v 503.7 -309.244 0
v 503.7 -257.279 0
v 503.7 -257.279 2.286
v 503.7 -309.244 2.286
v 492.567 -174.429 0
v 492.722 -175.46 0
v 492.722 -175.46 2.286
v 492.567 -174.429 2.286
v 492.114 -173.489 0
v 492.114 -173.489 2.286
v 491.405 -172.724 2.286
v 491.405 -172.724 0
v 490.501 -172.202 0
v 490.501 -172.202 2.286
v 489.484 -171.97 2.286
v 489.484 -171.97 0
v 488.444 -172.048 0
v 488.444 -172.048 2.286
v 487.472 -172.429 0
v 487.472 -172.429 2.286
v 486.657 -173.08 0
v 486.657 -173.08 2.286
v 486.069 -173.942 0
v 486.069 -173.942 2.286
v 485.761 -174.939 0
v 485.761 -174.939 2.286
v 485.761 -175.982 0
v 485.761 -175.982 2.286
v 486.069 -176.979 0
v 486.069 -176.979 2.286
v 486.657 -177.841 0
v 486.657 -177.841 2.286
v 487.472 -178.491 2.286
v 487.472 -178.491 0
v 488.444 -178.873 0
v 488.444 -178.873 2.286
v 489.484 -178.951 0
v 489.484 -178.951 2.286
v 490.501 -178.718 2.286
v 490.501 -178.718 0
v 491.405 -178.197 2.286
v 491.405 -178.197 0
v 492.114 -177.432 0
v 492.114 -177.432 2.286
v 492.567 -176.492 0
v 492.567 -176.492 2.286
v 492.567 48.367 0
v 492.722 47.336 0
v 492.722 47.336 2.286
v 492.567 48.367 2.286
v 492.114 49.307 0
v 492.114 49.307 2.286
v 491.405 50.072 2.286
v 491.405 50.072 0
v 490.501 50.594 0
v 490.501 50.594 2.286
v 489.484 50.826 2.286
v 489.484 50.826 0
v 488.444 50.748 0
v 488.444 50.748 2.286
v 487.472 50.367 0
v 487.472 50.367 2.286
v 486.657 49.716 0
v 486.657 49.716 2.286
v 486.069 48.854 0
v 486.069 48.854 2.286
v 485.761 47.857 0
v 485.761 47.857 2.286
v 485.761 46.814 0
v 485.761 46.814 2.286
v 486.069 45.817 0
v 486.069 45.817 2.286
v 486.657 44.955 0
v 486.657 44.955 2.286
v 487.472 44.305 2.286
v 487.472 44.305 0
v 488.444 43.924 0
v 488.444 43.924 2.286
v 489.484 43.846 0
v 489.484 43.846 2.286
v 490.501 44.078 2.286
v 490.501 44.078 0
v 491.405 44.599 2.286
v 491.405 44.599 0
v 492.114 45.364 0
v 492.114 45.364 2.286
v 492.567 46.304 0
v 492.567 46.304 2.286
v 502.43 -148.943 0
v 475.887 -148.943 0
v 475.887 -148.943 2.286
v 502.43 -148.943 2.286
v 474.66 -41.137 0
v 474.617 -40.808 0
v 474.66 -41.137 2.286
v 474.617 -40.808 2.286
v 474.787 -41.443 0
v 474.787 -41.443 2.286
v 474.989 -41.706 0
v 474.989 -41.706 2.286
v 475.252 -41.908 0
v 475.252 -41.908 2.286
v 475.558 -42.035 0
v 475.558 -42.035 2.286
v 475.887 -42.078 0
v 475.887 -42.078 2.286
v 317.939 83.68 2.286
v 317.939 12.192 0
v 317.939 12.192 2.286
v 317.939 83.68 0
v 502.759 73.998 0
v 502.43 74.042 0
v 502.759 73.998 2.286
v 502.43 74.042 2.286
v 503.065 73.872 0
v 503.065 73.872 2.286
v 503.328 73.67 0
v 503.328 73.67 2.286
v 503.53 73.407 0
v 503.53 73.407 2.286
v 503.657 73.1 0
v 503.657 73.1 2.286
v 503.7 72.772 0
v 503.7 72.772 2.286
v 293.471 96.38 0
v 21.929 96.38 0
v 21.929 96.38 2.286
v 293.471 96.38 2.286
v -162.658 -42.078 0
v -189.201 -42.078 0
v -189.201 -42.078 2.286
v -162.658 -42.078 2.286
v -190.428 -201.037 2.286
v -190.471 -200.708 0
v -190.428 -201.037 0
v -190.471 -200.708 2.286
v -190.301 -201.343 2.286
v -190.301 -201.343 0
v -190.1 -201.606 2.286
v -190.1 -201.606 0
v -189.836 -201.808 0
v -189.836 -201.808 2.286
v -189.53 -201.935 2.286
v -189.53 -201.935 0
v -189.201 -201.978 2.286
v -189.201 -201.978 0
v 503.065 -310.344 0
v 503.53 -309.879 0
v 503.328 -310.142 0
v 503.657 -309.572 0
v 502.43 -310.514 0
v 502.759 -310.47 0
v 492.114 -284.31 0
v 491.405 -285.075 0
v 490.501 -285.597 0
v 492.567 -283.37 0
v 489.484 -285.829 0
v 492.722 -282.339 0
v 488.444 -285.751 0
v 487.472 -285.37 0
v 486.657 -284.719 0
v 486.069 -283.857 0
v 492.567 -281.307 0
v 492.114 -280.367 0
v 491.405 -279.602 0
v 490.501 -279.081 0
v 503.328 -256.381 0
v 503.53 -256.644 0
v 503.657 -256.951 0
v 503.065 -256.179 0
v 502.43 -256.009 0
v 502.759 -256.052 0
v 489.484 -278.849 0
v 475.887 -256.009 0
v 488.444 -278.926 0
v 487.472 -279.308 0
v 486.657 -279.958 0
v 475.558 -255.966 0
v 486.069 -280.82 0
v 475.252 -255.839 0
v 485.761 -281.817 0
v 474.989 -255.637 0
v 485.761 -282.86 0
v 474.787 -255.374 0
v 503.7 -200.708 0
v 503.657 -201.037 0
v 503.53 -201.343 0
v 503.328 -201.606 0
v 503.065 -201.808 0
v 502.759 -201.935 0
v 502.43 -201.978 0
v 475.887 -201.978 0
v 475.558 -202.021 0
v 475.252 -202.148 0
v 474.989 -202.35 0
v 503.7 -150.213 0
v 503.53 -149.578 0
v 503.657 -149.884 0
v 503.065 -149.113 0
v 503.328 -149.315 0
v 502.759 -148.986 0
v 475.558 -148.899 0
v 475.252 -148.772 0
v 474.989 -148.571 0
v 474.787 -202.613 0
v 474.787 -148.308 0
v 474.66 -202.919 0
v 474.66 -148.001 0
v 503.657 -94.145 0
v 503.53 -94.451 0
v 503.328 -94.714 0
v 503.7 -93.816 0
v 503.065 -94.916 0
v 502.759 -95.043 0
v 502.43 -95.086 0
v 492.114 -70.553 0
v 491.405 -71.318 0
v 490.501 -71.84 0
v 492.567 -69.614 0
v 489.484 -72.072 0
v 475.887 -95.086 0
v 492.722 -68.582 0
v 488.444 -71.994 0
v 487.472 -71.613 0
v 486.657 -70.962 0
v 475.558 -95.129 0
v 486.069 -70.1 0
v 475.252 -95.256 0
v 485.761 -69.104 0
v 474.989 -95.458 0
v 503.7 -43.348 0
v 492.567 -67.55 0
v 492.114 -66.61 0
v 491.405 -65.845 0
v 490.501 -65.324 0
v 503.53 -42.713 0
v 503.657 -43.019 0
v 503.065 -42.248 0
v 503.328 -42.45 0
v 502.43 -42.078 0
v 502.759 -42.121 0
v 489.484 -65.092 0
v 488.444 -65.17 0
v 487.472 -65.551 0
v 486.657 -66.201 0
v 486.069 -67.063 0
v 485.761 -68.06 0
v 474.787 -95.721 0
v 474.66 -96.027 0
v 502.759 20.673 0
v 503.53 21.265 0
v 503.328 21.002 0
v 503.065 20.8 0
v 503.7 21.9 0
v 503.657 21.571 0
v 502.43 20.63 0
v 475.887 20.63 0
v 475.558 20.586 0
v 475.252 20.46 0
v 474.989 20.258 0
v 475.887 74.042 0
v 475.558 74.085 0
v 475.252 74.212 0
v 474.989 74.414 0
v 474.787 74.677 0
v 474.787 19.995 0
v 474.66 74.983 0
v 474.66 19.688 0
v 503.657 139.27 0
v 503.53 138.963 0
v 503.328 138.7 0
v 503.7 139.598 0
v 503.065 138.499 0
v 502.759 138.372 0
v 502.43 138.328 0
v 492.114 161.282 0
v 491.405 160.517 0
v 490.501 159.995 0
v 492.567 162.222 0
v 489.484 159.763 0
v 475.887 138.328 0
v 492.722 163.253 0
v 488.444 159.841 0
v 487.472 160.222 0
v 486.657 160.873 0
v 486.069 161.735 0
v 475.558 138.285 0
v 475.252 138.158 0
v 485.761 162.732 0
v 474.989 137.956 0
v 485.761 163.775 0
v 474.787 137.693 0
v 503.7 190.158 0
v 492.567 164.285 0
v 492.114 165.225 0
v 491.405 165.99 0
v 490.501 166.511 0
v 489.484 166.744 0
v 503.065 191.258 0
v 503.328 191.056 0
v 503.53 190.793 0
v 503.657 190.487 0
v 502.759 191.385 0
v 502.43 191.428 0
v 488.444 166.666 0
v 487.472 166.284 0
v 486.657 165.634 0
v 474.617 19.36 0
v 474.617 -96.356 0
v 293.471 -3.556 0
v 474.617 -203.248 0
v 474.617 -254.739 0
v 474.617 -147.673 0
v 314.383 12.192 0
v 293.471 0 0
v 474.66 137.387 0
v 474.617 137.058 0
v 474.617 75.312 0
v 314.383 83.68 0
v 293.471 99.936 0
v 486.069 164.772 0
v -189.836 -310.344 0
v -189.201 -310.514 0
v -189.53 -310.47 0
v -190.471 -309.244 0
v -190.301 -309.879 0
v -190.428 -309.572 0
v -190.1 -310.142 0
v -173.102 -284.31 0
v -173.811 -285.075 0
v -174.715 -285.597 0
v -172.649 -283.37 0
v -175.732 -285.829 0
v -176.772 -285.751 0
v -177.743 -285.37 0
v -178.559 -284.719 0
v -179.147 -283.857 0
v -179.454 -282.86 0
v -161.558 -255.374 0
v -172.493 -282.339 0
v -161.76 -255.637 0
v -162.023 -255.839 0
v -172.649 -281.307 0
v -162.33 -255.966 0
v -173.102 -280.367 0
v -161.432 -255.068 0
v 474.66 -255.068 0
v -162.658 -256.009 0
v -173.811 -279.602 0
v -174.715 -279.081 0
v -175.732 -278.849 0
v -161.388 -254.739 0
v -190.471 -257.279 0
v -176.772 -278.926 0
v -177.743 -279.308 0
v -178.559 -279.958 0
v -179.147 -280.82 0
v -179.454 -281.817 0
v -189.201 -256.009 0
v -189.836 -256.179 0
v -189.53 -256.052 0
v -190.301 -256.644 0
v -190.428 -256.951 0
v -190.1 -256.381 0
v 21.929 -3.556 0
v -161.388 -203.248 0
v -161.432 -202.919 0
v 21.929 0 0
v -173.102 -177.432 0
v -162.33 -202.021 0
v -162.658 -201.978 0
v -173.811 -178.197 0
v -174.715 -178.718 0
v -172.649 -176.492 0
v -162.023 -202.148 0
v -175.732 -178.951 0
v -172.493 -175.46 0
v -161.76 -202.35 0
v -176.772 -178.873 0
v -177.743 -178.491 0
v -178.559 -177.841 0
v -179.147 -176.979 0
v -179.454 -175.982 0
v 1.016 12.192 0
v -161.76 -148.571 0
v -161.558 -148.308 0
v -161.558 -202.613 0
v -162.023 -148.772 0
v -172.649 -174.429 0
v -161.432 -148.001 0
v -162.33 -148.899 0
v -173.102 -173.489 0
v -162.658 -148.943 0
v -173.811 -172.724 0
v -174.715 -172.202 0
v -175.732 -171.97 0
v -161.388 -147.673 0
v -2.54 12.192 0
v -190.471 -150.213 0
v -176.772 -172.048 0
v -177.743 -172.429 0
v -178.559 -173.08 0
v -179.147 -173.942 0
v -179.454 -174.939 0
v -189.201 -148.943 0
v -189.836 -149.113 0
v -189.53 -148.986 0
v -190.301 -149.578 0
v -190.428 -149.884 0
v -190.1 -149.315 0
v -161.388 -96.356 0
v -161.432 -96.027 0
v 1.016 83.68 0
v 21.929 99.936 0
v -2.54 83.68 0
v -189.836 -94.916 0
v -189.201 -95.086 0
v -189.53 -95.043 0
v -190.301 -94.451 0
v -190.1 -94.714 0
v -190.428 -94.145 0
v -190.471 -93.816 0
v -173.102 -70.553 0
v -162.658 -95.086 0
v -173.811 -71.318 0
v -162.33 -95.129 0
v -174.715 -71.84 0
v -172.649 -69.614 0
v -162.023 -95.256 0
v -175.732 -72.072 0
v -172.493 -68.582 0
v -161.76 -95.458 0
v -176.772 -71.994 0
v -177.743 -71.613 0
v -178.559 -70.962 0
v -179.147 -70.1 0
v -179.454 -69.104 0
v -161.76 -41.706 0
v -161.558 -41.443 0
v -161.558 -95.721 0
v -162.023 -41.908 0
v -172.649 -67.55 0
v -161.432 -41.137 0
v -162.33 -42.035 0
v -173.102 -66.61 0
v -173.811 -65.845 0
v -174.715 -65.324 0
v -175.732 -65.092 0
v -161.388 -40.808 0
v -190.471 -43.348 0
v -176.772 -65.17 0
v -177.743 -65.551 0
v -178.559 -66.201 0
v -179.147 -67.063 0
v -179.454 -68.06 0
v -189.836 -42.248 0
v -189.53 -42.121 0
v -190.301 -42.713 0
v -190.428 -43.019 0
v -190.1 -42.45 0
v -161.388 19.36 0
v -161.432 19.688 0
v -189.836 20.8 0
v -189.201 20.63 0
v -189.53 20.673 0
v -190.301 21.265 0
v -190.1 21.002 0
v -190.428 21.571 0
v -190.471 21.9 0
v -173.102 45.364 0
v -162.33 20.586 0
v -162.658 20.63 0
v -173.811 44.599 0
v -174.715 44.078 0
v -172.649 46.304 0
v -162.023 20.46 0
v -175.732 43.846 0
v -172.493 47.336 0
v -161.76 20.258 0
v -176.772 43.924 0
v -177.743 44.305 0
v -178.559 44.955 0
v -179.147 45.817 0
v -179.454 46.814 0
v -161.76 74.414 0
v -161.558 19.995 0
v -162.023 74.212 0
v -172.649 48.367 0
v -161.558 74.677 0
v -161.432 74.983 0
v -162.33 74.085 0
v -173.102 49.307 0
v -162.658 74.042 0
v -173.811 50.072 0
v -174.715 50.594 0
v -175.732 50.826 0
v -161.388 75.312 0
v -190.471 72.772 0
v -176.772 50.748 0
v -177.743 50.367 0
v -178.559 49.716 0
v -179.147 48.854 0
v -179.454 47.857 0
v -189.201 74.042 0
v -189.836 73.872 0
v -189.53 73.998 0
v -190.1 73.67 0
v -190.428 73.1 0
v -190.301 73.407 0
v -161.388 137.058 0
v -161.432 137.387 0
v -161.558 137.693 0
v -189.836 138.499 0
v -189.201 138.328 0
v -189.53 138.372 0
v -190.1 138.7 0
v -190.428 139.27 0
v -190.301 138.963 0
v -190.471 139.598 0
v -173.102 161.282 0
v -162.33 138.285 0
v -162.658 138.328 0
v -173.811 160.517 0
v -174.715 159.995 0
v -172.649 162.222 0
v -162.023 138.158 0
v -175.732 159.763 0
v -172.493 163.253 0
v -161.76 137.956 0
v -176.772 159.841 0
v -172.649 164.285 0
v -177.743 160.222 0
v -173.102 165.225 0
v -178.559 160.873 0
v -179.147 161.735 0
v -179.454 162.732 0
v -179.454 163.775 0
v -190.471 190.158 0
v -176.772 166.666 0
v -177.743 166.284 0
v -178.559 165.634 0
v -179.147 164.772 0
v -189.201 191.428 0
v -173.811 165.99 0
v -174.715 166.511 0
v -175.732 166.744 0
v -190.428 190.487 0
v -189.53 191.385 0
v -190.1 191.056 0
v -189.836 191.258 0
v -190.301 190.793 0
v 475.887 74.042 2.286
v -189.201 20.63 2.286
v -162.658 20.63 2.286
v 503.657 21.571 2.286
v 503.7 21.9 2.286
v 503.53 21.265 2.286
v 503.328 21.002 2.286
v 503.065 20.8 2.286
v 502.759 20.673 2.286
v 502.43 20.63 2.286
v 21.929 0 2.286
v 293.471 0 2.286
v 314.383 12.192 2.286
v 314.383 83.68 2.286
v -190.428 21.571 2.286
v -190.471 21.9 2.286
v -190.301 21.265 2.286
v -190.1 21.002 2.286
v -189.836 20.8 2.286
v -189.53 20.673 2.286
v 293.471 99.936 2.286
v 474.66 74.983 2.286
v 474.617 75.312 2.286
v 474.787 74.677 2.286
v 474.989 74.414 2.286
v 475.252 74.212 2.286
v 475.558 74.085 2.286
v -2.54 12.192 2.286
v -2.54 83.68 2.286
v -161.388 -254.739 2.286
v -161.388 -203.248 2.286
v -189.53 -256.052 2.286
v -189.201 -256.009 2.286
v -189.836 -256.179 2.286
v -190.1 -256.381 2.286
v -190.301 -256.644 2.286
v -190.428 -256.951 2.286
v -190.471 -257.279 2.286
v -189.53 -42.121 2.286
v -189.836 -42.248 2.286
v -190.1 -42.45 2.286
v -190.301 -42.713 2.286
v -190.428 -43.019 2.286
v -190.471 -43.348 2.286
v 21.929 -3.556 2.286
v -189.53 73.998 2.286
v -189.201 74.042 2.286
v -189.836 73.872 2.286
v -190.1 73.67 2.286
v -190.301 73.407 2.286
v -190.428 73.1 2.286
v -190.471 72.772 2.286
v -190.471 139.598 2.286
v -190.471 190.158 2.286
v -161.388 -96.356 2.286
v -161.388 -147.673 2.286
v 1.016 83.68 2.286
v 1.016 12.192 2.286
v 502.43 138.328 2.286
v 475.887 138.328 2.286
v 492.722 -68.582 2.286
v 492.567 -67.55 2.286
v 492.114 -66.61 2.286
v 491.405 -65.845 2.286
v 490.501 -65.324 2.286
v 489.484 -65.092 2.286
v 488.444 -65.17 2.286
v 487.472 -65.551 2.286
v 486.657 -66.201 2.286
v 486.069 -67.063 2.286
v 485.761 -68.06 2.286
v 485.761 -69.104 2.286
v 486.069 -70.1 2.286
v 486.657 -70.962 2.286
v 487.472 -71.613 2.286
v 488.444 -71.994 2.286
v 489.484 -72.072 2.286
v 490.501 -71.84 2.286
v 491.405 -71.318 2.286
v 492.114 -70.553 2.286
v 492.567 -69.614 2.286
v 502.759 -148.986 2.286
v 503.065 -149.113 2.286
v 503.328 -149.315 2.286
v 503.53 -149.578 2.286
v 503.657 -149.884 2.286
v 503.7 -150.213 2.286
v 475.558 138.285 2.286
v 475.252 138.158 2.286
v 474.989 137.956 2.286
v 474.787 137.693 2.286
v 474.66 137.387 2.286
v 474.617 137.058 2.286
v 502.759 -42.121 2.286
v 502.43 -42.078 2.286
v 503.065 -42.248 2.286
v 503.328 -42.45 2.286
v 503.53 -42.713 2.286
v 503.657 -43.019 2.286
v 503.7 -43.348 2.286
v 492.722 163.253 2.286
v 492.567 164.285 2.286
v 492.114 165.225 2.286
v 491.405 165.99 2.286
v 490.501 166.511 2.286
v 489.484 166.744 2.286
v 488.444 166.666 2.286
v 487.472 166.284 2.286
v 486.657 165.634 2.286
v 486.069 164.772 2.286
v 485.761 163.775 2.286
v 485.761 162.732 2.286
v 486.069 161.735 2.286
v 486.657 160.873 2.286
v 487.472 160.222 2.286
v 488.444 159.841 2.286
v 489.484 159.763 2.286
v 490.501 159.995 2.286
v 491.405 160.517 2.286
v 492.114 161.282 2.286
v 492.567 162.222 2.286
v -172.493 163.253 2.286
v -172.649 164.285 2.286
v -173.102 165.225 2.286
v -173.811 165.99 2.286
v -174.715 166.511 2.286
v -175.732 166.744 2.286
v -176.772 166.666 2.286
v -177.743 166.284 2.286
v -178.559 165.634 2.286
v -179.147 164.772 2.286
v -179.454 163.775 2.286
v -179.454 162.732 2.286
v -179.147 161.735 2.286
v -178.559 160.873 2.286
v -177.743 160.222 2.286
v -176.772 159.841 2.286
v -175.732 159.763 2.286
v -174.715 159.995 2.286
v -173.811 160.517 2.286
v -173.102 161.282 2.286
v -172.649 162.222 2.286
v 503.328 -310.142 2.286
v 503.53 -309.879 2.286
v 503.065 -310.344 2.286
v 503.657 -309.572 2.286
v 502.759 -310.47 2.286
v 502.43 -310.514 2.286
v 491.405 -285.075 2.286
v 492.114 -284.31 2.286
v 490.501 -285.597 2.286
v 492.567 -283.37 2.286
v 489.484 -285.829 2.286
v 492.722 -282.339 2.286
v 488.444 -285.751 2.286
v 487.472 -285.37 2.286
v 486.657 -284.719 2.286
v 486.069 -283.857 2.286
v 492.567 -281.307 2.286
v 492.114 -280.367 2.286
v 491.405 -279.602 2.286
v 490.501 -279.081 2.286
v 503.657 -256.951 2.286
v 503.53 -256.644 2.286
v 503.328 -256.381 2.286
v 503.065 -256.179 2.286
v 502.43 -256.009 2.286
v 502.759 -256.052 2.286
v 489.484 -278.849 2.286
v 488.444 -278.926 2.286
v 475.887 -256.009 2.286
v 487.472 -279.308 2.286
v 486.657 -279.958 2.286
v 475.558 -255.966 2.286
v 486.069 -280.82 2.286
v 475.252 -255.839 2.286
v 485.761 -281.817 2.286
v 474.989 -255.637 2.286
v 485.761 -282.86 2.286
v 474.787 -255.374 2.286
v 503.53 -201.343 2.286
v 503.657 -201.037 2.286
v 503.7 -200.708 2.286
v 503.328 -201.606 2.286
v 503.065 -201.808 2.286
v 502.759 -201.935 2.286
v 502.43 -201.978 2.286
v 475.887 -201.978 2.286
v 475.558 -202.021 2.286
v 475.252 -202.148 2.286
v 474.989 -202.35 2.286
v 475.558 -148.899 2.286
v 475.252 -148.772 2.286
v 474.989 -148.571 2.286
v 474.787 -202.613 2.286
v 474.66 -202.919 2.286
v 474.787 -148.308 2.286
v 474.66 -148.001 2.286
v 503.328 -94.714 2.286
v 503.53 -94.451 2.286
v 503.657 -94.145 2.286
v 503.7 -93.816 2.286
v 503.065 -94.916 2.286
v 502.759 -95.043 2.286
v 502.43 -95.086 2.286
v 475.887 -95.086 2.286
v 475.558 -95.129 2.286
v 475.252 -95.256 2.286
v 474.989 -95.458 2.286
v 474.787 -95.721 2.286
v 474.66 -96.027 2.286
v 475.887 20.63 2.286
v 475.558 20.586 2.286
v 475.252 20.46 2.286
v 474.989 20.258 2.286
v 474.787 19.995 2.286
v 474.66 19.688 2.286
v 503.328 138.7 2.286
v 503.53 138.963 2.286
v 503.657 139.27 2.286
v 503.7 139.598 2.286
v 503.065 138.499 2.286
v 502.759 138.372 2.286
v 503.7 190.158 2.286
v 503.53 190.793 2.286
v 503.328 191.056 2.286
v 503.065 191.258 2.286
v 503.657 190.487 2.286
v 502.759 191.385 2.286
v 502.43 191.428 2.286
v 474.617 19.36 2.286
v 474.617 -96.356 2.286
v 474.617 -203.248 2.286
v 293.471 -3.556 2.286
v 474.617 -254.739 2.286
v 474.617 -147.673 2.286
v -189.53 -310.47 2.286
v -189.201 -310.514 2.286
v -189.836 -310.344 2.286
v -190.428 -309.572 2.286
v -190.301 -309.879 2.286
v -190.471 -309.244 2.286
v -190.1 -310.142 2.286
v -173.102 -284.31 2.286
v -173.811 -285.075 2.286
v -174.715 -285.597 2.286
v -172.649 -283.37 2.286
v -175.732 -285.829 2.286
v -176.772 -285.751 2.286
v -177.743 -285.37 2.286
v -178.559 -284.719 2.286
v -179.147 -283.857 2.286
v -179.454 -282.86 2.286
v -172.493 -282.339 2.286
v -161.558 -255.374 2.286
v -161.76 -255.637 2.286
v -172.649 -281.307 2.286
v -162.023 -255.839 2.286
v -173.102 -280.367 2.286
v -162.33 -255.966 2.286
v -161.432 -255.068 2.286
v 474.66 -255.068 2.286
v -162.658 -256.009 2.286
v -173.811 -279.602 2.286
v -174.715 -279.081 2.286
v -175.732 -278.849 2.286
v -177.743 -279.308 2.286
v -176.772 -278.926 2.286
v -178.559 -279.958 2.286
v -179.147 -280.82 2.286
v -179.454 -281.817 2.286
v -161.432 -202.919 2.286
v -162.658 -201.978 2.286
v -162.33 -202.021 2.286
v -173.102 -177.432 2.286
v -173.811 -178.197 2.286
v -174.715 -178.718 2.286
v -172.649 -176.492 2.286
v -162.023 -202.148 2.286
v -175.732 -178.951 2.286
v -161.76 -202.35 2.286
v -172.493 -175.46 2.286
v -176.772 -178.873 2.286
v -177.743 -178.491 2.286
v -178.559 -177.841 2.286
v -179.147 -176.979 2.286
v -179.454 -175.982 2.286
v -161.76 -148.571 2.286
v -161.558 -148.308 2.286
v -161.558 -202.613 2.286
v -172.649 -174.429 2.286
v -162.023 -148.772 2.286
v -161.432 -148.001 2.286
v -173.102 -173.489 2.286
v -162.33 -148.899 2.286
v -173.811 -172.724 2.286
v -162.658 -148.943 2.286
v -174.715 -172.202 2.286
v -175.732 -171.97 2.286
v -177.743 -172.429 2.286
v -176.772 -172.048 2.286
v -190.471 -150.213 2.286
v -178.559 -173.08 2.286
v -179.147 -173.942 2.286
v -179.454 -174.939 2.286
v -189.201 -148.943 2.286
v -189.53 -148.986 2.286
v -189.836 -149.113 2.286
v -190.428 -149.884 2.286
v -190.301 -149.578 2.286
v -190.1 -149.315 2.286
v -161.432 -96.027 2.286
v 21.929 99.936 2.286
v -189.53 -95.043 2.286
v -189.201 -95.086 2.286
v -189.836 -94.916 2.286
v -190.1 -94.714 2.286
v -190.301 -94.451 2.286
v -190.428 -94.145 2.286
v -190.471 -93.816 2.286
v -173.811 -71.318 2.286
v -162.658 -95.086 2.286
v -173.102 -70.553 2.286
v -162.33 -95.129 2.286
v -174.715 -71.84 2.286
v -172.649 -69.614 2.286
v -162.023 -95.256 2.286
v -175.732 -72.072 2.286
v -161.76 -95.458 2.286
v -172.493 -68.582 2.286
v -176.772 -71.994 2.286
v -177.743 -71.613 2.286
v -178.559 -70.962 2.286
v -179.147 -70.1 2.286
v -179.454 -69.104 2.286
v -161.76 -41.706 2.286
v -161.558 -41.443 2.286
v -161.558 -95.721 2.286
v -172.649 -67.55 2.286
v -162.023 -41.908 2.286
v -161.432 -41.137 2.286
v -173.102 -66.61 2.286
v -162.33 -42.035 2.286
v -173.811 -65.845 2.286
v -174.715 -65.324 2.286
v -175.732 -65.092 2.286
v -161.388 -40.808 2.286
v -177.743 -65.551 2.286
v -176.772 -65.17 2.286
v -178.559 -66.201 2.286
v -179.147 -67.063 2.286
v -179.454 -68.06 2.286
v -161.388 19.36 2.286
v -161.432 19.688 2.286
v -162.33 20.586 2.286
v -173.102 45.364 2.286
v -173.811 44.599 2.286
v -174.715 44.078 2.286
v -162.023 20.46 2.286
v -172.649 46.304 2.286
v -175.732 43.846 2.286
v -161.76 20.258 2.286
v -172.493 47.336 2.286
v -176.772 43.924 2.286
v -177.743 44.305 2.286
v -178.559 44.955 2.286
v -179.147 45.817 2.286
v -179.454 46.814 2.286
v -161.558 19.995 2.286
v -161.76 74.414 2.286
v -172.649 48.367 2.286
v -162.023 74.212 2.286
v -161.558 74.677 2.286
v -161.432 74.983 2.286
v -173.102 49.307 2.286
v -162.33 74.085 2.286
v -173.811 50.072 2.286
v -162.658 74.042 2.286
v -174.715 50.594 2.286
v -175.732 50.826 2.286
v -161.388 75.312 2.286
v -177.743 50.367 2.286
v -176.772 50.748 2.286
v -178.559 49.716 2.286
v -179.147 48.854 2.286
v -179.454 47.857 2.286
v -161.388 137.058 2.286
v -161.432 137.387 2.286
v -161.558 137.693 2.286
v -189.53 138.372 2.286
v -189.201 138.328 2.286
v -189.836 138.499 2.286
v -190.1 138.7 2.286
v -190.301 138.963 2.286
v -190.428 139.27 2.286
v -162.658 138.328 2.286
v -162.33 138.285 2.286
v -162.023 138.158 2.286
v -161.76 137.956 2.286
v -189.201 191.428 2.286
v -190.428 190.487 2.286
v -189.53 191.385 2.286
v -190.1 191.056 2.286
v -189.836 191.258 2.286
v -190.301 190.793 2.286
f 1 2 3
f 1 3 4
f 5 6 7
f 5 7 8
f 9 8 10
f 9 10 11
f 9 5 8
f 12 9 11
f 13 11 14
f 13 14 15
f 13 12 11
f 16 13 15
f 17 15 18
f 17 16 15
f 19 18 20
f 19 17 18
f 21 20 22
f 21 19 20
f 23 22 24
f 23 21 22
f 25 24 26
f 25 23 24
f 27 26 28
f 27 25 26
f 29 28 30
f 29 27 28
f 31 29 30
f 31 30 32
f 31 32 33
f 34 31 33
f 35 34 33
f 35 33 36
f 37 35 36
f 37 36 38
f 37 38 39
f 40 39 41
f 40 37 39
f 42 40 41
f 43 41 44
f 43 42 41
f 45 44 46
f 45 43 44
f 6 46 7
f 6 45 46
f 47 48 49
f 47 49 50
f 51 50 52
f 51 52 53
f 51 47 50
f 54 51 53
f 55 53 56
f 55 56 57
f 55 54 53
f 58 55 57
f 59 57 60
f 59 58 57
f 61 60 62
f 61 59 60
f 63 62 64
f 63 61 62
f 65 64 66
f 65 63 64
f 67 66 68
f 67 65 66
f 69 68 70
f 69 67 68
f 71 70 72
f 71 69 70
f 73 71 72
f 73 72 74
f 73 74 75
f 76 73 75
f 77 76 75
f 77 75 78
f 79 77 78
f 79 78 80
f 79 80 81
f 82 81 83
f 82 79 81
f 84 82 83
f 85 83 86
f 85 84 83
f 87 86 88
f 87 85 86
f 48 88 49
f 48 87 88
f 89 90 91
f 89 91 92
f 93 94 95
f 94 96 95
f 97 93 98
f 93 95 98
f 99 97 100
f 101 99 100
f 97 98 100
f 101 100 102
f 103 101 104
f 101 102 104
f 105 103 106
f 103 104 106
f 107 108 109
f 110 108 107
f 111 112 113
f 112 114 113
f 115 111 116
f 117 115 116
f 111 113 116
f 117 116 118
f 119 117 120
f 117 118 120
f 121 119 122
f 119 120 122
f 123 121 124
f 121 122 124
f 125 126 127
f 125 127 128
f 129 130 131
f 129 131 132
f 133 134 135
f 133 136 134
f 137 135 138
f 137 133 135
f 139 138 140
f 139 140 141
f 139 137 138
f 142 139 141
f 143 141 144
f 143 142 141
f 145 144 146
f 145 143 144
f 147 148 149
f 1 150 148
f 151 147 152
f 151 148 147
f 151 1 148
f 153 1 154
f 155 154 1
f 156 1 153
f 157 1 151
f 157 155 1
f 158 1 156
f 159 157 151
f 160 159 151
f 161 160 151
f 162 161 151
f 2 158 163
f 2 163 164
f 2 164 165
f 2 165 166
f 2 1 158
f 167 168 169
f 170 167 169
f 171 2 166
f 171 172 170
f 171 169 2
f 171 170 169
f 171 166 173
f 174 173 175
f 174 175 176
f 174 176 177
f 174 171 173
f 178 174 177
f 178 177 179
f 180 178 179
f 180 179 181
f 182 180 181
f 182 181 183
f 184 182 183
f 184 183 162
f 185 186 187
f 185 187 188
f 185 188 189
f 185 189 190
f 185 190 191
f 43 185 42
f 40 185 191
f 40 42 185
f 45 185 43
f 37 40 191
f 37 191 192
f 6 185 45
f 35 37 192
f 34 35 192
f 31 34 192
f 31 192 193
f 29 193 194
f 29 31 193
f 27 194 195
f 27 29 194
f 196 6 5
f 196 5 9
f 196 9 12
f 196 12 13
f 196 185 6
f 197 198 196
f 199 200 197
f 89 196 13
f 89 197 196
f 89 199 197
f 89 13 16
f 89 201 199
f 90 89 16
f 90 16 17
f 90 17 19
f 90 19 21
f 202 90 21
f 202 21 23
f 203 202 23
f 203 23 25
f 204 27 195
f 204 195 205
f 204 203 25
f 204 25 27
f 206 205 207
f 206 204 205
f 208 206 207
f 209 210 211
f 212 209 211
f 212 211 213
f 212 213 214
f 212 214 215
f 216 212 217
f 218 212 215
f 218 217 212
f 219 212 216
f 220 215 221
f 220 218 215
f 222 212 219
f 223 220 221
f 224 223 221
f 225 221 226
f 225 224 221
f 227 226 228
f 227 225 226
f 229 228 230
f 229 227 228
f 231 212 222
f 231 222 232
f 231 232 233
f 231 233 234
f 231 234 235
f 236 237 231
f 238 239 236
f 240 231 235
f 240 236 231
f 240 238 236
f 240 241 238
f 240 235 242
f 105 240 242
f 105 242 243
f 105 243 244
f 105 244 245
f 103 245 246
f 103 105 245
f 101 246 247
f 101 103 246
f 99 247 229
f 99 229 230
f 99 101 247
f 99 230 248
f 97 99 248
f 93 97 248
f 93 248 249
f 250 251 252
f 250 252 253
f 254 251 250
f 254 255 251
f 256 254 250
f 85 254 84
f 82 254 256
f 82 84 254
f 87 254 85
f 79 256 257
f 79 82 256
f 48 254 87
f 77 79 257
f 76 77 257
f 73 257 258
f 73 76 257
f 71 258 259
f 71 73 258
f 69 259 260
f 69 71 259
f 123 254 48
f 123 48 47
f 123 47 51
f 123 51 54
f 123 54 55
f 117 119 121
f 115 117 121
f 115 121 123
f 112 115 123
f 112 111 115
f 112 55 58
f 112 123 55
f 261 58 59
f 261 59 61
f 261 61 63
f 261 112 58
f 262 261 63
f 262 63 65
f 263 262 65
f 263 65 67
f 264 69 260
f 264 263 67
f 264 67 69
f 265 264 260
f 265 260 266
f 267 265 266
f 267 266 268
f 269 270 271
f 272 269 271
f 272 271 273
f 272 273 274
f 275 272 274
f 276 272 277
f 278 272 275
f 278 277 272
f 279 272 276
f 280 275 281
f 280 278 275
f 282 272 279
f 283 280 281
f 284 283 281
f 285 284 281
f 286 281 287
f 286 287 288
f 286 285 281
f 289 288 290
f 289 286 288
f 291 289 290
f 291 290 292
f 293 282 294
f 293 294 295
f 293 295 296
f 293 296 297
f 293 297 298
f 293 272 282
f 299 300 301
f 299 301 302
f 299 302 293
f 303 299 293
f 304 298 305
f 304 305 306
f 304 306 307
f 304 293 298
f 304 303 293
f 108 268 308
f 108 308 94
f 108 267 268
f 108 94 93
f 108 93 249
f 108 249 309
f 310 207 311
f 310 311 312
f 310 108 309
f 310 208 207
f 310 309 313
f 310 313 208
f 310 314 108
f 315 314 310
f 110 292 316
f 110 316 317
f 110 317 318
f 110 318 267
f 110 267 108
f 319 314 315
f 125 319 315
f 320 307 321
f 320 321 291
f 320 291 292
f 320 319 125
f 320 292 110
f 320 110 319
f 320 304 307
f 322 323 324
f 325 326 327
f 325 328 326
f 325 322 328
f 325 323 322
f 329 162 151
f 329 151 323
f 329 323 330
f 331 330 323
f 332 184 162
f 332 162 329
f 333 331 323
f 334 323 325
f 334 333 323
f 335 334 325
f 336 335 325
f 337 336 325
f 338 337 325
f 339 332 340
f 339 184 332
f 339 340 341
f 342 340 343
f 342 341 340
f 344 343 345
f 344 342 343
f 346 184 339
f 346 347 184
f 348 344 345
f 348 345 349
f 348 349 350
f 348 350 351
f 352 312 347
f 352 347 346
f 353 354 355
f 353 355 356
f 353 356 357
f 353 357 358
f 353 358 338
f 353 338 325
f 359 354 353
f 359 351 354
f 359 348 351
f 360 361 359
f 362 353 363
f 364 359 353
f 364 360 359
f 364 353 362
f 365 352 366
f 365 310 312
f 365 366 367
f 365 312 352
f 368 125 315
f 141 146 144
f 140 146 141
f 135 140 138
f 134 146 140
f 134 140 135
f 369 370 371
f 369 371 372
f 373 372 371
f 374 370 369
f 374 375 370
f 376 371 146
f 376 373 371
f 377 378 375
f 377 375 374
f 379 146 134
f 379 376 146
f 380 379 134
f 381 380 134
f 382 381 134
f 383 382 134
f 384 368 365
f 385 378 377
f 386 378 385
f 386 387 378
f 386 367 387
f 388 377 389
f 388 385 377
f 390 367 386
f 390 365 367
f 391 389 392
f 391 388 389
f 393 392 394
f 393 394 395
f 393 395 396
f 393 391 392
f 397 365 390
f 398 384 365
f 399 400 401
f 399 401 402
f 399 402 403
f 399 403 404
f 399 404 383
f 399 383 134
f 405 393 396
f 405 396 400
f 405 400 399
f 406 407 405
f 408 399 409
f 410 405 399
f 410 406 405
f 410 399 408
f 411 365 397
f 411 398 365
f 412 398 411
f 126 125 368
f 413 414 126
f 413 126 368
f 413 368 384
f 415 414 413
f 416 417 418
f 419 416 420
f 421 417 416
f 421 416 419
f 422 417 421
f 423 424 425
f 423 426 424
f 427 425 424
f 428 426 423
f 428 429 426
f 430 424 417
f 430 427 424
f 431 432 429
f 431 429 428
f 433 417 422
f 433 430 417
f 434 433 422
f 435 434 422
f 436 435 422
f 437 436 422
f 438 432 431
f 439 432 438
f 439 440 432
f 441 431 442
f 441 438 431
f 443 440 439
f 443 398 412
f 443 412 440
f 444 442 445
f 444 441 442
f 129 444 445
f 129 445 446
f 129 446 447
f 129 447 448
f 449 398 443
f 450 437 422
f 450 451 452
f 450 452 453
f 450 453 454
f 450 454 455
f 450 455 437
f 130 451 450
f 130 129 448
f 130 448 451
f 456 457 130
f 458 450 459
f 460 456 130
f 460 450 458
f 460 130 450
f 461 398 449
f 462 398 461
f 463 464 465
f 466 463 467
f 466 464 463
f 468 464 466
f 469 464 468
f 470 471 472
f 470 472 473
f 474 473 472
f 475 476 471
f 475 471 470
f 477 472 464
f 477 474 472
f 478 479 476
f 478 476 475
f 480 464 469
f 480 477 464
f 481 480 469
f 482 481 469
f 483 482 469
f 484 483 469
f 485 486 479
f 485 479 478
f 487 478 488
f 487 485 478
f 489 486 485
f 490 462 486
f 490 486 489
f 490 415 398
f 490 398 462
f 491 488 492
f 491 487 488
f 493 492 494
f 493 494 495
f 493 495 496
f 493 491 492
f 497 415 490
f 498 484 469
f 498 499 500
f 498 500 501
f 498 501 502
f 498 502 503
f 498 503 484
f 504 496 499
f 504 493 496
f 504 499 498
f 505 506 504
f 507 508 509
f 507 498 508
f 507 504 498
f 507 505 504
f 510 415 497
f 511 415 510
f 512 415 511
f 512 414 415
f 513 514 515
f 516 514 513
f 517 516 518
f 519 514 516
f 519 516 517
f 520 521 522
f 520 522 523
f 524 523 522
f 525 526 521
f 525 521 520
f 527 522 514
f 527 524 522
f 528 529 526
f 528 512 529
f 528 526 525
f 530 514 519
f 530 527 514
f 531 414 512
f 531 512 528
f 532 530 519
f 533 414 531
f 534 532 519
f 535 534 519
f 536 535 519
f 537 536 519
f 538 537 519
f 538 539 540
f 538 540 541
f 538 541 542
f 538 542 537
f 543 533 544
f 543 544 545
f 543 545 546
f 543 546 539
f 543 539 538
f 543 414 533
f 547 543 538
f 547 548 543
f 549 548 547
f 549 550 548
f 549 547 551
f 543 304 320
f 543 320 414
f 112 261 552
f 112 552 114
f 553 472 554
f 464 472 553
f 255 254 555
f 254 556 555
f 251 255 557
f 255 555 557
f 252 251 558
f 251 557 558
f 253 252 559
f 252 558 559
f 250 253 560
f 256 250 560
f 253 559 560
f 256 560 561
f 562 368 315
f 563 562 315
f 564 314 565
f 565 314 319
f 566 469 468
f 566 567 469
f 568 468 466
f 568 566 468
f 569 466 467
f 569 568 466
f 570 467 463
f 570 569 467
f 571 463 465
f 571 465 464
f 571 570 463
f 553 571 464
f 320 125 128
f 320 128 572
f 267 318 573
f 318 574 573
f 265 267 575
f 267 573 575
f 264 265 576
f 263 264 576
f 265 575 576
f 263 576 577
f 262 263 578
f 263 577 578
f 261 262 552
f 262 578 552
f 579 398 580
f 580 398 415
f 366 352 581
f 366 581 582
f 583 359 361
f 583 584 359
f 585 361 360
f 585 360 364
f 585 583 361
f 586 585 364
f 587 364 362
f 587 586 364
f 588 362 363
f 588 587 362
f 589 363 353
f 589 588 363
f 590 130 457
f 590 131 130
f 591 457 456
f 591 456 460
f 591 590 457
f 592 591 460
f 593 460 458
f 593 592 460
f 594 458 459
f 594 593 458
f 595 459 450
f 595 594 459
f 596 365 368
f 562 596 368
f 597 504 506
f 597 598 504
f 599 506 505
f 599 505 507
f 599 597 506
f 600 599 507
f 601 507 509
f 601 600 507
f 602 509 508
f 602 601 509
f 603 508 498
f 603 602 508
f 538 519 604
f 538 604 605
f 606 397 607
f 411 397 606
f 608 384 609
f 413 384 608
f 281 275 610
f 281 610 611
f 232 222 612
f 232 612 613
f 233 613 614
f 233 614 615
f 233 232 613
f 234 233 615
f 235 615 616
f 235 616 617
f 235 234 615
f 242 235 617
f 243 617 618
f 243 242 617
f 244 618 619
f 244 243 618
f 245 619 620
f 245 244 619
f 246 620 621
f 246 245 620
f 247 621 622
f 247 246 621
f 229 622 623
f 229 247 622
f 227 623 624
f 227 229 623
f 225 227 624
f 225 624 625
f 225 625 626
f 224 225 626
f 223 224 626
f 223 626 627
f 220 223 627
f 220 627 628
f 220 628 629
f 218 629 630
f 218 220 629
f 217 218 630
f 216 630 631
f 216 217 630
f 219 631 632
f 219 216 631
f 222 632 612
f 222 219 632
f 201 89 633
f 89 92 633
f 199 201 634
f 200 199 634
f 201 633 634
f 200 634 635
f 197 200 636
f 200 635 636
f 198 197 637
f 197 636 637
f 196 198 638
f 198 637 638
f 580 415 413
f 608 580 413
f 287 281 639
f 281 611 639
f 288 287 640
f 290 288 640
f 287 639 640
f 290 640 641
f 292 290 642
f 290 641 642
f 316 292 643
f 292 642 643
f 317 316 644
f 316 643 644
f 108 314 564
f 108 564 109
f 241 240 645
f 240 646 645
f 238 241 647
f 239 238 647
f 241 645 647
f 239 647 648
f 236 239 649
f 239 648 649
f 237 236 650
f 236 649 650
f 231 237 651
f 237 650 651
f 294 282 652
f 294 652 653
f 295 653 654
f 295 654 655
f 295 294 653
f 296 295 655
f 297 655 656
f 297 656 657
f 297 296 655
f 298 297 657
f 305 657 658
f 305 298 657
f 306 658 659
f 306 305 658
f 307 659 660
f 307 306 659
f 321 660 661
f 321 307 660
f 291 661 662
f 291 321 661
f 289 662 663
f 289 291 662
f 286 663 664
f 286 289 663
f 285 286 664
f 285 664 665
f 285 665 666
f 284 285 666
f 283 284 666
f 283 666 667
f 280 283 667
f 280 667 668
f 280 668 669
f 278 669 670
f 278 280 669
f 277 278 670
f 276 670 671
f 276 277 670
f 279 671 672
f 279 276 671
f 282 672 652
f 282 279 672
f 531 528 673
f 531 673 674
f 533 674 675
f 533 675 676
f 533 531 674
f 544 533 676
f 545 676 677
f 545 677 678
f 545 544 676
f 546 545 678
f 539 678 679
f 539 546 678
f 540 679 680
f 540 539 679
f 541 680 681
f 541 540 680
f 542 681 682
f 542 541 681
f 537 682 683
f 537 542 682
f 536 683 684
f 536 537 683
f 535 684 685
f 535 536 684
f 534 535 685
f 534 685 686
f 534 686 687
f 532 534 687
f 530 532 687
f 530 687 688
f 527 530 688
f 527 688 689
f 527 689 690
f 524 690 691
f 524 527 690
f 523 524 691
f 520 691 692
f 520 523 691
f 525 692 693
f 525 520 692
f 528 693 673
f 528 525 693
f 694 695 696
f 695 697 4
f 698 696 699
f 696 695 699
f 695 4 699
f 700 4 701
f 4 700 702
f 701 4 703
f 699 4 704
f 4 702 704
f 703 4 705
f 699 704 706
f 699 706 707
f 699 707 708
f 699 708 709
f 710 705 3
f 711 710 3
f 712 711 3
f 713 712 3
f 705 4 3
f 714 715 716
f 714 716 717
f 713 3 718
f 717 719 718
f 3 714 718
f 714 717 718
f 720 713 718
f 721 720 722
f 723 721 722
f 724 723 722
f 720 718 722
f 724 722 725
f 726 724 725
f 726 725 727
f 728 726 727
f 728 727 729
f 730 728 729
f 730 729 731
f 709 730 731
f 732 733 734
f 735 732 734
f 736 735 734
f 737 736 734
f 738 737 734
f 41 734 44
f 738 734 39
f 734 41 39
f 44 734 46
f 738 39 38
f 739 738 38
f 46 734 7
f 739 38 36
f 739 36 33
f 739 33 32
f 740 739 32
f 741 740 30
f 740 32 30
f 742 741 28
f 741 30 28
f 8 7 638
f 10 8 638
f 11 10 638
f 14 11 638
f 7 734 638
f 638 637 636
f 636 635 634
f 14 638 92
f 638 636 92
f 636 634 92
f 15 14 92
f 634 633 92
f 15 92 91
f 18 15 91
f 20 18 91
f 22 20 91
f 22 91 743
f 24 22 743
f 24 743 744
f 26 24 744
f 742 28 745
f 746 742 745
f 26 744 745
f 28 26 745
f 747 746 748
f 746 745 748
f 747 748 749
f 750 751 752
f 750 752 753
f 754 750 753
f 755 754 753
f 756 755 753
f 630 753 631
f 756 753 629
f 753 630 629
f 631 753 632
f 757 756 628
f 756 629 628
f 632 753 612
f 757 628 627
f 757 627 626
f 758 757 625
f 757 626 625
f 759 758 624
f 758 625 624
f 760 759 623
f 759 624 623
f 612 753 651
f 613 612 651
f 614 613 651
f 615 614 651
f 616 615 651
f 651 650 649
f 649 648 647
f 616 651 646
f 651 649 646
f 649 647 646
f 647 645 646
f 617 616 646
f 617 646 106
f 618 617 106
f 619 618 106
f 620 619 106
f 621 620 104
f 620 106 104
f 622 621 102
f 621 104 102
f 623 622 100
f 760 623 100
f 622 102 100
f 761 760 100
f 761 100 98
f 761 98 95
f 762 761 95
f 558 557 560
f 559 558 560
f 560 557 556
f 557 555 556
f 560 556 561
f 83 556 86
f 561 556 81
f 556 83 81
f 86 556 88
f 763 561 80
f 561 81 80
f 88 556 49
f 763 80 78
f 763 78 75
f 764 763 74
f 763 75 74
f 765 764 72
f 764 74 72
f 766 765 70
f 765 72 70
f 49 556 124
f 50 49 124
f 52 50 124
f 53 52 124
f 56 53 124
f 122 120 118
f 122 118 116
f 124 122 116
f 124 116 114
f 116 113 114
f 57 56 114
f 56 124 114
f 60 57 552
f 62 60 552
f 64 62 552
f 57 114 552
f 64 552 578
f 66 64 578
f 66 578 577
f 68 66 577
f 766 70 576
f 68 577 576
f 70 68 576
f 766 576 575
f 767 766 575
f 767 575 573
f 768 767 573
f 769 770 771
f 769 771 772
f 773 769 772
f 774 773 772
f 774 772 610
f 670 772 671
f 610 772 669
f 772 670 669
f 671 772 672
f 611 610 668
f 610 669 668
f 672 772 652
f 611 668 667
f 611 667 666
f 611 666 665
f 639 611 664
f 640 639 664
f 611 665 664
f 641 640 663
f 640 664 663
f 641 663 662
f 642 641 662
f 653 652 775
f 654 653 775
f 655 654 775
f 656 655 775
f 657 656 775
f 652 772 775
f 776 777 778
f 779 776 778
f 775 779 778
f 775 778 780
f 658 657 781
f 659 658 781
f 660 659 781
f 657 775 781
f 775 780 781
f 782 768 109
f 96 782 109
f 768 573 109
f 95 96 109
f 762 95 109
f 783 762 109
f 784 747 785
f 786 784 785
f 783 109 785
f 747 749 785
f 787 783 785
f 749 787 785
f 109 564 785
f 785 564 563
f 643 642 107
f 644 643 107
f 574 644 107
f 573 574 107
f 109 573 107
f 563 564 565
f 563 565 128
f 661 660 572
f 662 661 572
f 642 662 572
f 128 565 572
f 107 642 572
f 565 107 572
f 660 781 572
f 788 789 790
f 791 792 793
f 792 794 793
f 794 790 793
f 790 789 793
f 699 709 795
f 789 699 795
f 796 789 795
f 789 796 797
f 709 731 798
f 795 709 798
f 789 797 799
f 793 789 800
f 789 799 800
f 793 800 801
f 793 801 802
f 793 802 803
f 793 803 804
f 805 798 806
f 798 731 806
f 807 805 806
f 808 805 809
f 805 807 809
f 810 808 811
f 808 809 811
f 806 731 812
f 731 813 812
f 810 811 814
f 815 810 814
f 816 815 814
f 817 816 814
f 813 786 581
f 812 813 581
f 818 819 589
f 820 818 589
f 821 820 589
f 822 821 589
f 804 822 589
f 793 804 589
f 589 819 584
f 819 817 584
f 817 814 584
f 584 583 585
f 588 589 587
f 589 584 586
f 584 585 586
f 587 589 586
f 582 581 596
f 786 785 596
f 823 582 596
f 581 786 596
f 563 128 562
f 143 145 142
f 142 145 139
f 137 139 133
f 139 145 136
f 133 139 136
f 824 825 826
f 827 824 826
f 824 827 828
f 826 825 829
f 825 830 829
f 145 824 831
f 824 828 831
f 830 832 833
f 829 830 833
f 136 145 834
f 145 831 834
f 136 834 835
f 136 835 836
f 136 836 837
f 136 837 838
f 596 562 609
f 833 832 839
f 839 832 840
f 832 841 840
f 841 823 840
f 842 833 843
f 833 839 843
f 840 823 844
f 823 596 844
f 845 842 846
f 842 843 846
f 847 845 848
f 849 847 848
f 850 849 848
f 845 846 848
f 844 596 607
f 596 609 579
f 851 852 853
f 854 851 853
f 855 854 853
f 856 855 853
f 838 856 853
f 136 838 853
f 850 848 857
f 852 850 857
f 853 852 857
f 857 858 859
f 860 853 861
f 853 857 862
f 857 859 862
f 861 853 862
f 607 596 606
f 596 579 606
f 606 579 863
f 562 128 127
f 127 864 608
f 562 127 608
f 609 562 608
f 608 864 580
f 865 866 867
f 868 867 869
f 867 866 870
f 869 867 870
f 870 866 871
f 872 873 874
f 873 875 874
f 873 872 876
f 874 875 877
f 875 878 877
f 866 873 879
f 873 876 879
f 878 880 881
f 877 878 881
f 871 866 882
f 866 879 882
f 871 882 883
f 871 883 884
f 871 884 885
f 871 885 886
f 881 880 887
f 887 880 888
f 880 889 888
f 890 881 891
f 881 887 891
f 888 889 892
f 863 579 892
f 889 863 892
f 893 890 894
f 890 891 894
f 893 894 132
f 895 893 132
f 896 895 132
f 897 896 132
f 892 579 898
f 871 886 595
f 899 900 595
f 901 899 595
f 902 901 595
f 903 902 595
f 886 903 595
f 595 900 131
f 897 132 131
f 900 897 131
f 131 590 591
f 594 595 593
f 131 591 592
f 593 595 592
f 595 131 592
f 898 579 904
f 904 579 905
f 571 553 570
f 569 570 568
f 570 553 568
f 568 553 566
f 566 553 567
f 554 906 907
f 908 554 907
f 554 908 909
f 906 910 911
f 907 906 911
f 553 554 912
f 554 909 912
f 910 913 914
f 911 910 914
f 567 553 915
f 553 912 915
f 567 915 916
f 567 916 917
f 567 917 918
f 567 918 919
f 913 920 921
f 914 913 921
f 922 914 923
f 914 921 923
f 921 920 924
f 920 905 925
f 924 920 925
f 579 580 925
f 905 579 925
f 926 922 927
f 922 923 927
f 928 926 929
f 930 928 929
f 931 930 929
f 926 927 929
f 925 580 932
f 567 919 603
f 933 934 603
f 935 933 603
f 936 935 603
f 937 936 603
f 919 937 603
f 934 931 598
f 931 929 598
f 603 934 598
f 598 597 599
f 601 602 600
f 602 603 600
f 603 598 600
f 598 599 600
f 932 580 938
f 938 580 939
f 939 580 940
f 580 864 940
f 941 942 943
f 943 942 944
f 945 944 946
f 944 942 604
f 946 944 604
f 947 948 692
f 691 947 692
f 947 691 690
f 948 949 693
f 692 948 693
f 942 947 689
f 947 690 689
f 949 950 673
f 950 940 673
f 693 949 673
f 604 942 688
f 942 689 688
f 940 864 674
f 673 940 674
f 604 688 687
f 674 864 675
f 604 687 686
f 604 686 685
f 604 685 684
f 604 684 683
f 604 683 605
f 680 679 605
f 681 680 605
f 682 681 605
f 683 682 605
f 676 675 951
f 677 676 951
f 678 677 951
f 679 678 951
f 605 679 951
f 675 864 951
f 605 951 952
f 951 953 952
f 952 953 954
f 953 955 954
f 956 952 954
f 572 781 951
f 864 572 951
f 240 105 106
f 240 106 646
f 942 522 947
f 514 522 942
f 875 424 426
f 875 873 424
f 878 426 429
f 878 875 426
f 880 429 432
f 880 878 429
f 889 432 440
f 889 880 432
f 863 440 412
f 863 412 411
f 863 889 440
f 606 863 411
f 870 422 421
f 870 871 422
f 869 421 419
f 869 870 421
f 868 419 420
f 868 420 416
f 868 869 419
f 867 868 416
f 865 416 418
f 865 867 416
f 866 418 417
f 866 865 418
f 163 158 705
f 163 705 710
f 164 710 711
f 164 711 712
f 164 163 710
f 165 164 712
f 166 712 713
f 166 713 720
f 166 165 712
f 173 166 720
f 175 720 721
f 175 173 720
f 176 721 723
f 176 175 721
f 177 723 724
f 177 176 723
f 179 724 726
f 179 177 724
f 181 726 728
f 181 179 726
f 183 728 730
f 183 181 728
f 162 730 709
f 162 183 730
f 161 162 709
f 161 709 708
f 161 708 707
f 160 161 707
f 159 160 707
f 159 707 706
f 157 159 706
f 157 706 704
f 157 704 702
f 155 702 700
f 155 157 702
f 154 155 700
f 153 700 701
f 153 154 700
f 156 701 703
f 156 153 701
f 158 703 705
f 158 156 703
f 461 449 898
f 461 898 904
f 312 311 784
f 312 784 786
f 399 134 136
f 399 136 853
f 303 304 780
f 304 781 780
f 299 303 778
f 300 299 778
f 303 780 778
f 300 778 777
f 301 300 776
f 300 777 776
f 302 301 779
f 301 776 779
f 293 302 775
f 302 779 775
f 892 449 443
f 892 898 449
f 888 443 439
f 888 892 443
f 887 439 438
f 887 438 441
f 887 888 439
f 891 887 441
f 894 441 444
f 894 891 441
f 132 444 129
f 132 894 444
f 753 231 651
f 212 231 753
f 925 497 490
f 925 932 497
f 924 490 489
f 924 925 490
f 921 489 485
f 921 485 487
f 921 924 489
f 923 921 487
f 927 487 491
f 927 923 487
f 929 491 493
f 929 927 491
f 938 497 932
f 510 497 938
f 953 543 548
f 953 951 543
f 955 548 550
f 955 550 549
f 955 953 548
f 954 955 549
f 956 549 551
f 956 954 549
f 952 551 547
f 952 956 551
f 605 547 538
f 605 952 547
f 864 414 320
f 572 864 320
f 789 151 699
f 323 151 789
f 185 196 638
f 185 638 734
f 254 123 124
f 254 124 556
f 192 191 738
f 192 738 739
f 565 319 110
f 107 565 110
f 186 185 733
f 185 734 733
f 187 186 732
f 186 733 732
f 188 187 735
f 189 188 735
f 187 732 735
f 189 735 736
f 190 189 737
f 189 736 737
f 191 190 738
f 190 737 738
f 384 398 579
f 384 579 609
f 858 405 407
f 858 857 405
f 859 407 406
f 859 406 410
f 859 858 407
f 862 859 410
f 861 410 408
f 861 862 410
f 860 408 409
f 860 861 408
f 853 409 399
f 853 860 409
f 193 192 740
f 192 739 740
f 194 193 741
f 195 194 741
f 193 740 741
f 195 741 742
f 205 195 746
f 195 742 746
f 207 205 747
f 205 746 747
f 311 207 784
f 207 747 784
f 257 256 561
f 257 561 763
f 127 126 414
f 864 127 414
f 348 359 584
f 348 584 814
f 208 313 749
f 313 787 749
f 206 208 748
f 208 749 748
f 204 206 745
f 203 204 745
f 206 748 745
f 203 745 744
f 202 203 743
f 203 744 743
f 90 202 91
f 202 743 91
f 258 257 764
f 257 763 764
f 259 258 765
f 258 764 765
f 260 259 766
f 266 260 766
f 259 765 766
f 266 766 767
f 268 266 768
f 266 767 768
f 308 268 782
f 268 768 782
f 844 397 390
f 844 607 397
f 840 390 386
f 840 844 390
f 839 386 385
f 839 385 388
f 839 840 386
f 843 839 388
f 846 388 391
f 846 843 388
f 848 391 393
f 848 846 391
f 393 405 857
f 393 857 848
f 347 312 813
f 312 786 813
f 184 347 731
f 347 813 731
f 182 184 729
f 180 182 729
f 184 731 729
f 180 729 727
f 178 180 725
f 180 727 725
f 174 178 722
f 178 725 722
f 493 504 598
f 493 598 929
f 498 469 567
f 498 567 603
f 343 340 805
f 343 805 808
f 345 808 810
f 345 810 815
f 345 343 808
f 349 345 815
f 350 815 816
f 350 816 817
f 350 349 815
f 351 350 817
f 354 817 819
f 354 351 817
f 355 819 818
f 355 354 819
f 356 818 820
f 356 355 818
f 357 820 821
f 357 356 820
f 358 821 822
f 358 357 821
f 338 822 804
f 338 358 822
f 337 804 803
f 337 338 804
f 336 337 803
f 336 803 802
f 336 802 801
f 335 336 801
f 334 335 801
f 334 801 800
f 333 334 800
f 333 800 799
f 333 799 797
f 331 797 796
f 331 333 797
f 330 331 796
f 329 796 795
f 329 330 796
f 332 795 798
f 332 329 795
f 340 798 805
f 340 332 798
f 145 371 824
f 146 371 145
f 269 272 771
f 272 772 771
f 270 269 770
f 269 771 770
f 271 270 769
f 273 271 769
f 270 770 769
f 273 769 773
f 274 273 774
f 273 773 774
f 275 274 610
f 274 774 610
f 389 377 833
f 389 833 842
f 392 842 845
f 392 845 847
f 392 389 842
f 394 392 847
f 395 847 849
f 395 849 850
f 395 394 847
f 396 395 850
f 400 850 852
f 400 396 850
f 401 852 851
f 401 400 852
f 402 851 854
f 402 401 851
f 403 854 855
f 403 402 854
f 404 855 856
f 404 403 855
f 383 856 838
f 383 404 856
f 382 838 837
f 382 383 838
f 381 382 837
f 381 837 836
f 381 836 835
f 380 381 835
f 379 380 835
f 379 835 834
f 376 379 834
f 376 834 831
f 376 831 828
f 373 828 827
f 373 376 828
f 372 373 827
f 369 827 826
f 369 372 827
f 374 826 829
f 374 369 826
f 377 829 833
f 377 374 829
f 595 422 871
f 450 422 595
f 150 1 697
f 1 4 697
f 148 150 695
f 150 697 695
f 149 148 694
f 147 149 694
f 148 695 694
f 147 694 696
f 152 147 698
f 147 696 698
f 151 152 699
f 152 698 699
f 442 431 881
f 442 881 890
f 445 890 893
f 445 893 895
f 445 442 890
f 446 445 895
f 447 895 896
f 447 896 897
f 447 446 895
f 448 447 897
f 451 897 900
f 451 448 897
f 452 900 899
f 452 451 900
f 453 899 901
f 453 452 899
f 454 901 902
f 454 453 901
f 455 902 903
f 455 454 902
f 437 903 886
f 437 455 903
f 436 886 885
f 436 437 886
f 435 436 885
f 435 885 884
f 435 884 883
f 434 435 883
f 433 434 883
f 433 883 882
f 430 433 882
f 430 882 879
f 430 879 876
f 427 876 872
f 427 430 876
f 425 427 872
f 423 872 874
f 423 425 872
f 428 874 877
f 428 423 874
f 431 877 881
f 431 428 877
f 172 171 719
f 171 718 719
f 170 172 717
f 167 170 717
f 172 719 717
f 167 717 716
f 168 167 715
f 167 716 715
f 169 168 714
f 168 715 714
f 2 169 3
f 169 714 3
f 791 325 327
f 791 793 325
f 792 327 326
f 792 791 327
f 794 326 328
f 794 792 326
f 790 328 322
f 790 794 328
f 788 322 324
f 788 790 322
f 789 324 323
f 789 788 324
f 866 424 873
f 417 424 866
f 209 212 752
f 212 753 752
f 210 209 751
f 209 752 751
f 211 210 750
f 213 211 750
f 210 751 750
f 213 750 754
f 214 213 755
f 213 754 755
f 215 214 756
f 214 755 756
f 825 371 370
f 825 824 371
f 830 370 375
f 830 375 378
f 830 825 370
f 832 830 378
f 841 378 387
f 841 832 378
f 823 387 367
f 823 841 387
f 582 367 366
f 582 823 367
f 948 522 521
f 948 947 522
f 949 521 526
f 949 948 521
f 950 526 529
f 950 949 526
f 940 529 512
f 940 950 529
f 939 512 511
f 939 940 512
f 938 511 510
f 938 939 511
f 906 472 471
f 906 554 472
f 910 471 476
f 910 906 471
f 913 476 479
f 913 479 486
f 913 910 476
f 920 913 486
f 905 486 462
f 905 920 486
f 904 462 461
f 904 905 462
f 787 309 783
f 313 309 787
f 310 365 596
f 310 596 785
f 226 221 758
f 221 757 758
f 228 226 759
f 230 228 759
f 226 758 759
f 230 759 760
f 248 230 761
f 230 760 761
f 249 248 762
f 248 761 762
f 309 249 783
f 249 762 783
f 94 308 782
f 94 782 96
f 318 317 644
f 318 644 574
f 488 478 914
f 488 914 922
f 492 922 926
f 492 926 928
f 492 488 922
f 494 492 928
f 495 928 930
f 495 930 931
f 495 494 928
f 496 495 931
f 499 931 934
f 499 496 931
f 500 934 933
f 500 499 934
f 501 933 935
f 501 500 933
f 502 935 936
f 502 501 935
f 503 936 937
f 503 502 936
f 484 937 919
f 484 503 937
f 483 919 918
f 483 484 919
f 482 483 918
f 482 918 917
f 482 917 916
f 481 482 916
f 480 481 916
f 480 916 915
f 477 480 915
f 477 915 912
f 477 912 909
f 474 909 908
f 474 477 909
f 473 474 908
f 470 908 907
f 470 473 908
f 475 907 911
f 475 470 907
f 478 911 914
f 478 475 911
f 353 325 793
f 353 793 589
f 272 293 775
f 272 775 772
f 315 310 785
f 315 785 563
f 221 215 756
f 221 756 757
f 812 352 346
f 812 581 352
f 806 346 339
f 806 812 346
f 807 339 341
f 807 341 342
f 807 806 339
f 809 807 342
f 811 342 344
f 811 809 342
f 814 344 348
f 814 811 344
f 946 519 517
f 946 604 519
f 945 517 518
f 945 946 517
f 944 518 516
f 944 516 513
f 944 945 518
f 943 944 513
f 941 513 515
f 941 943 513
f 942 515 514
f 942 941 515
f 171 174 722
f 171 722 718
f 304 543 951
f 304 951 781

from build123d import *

# Parameters (mm, degrees)
SKETCH1_R           = 3.5
SKETCH1_W           = 271.54175435
SKETCH1_H           = 3.556
SKETCH1_W_2         = 3.556
SKETCH1_H_2         = 71.4883
BOSS_EXTRUDE1_DEPTH = 2.286
FILLET1_R           = 1.27


with BuildPart() as part:
    # Sketch1 → Boss-Extrude1 (new body)
    with BuildSketch(Plane.XY):
        Polygon((-190.471476969, 191.42838219), (503.700363031, 191.42838219), (503.700363031, 138.32838219), (474.617169309, 138.32838219), (474.617169309, 74.041741872), (503.700363031, 74.041741872), (503.700363031, 20.629767615), (474.617169309, 20.629767615), (474.617169309, -42.077913962), (503.700363031, -42.077913962), (503.700363031, -95.085831367), (474.617169309, -95.085831367), (474.617169309, -148.942582796), (503.700363031, -148.942582796), (503.700363031, -201.978007641), (474.617169309, -201.978007641), (474.617169309, -256.009209725), (503.700363031, -256.009209725), (503.700363031, -310.51371781), (-190.471476969, -310.51371781), (-190.471476969, -256.009209725), (-161.388283246, -256.009209725), (-161.388283246, -201.978007641), (-190.471476969, -201.978007641), (-190.471476969, -148.942582796), (-161.388283246, -148.942582796), (-161.388283246, -95.085831367), (-190.471476969, -95.085831367), (-190.471476969, -42.077913962), (-161.388283246, -42.077913962), (-161.388283246, 20.629767615), (-190.471476969, 20.629767615), (-190.471476969, 74.041741872), (-161.388283246, 74.041741872), (-161.388283246, 138.32838219), (-190.471476969, 138.32838219), align=None)
        with Locations((-175.993476969, 163.253382152)):
            Circle(SKETCH1_R, mode=Mode.SUBTRACT)
        with Locations((-175.993476969, 47.335754744)):
            Circle(SKETCH1_R, mode=Mode.SUBTRACT)
        with Locations((-175.993476969, -68.581872664)):
            Circle(SKETCH1_R, mode=Mode.SUBTRACT)
        with Locations((-175.993476969, -175.460295218)):
            Circle(SKETCH1_R, mode=Mode.SUBTRACT)
        with Locations((-175.993476969, -282.338717772)):
            Circle(SKETCH1_R, mode=Mode.SUBTRACT)
        with Locations((489.222363031, 163.253382152)):
            Circle(SKETCH1_R, mode=Mode.SUBTRACT)
        with Locations((489.222363031, 47.335754744)):
            Circle(SKETCH1_R, mode=Mode.SUBTRACT)
        with Locations((489.222363031, -68.581872664)):
            Circle(SKETCH1_R, mode=Mode.SUBTRACT)
        with Locations((489.222363031, -175.460295218)):
            Circle(SKETCH1_R, mode=Mode.SUBTRACT)
        with Locations((489.222363031, -282.338717772)):
            Circle(SKETCH1_R, mode=Mode.SUBTRACT)
        with Locations((157.69971, 98.1583)):
            Rectangle(SKETCH1_W, SKETCH1_H, mode=Mode.SUBTRACT)
        with Locations((-0.762, 47.93615)):
            Rectangle(SKETCH1_W_2, SKETCH1_H_2, mode=Mode.SUBTRACT)
        with Locations((316.16142, 47.93615)):
            Rectangle(SKETCH1_W_2, SKETCH1_H_2, mode=Mode.SUBTRACT)
        with Locations((157.69971, -1.778)):
            Rectangle(SKETCH1_W, SKETCH1_H, mode=Mode.SUBTRACT)
    extrude(amount=BOSS_EXTRUDE1_DEPTH)

    # Fillet1
    fillet1_edges = [part.edges().sort_by_distance(p)[0] for p in [
        (-161.388283246, 74.041741872, 1.143),
        (-161.388283246, 138.32838219, 1.143),
        (-190.471476969, 138.32838219, 1.143),
        (-190.471476969, 191.42838219, 1.143),
        (503.700363031, 191.42838219, 1.143),
        (503.700363031, 138.32838219, 1.143),
        (474.617169309, 138.32838219, 1.143),
        (474.617169309, 74.041741872, 1.143),
        (503.700363031, 74.041741872, 1.143),
        (503.700363031, 20.629767615, 1.143),
        (474.617169309, 20.629767615, 1.143),
        (474.617169309, -42.077913962, 1.143),
        (503.700363031, -42.077913962, 1.143),
        (503.700363031, -95.085831367, 1.143),
        (474.617169309, -95.085831367, 1.143),
        (474.617169309, -148.942582796, 1.143),
        (503.700363031, -148.942582796, 1.143),
        (503.700363031, -201.978007641, 1.143),
        (474.617169309, -201.978007641, 1.143),
        (474.617169309, -256.009209725, 1.143),
        (503.700363031, -256.009209725, 1.143),
        (503.700363031, -310.51371781, 1.143),
        (-190.471476969, -310.51371781, 1.143),
        (-190.471476969, -256.009209725, 1.143),
        (-161.388283246, -256.009209725, 1.143),
        (-161.388283246, -201.978007641, 1.143),
        (-190.471476969, -201.978007641, 1.143),
        (-190.471476969, -148.942582796, 1.143),
        (-161.388283246, -148.942582796, 1.143),
        (-161.388283246, -95.085831367, 1.143),
        (-190.471476969, -95.085831367, 1.143),
        (-190.471476969, -42.077913962, 1.143),
        (-161.388283246, -42.077913962, 1.143),
        (-161.388283246, 20.629767615, 1.143),
        (-190.471476969, 20.629767615, 1.143),
        (-190.471476969, 74.041741872, 1.143),
    ]]
    fillet(fillet1_edges, radius=FILLET1_R)


solid = part.part
